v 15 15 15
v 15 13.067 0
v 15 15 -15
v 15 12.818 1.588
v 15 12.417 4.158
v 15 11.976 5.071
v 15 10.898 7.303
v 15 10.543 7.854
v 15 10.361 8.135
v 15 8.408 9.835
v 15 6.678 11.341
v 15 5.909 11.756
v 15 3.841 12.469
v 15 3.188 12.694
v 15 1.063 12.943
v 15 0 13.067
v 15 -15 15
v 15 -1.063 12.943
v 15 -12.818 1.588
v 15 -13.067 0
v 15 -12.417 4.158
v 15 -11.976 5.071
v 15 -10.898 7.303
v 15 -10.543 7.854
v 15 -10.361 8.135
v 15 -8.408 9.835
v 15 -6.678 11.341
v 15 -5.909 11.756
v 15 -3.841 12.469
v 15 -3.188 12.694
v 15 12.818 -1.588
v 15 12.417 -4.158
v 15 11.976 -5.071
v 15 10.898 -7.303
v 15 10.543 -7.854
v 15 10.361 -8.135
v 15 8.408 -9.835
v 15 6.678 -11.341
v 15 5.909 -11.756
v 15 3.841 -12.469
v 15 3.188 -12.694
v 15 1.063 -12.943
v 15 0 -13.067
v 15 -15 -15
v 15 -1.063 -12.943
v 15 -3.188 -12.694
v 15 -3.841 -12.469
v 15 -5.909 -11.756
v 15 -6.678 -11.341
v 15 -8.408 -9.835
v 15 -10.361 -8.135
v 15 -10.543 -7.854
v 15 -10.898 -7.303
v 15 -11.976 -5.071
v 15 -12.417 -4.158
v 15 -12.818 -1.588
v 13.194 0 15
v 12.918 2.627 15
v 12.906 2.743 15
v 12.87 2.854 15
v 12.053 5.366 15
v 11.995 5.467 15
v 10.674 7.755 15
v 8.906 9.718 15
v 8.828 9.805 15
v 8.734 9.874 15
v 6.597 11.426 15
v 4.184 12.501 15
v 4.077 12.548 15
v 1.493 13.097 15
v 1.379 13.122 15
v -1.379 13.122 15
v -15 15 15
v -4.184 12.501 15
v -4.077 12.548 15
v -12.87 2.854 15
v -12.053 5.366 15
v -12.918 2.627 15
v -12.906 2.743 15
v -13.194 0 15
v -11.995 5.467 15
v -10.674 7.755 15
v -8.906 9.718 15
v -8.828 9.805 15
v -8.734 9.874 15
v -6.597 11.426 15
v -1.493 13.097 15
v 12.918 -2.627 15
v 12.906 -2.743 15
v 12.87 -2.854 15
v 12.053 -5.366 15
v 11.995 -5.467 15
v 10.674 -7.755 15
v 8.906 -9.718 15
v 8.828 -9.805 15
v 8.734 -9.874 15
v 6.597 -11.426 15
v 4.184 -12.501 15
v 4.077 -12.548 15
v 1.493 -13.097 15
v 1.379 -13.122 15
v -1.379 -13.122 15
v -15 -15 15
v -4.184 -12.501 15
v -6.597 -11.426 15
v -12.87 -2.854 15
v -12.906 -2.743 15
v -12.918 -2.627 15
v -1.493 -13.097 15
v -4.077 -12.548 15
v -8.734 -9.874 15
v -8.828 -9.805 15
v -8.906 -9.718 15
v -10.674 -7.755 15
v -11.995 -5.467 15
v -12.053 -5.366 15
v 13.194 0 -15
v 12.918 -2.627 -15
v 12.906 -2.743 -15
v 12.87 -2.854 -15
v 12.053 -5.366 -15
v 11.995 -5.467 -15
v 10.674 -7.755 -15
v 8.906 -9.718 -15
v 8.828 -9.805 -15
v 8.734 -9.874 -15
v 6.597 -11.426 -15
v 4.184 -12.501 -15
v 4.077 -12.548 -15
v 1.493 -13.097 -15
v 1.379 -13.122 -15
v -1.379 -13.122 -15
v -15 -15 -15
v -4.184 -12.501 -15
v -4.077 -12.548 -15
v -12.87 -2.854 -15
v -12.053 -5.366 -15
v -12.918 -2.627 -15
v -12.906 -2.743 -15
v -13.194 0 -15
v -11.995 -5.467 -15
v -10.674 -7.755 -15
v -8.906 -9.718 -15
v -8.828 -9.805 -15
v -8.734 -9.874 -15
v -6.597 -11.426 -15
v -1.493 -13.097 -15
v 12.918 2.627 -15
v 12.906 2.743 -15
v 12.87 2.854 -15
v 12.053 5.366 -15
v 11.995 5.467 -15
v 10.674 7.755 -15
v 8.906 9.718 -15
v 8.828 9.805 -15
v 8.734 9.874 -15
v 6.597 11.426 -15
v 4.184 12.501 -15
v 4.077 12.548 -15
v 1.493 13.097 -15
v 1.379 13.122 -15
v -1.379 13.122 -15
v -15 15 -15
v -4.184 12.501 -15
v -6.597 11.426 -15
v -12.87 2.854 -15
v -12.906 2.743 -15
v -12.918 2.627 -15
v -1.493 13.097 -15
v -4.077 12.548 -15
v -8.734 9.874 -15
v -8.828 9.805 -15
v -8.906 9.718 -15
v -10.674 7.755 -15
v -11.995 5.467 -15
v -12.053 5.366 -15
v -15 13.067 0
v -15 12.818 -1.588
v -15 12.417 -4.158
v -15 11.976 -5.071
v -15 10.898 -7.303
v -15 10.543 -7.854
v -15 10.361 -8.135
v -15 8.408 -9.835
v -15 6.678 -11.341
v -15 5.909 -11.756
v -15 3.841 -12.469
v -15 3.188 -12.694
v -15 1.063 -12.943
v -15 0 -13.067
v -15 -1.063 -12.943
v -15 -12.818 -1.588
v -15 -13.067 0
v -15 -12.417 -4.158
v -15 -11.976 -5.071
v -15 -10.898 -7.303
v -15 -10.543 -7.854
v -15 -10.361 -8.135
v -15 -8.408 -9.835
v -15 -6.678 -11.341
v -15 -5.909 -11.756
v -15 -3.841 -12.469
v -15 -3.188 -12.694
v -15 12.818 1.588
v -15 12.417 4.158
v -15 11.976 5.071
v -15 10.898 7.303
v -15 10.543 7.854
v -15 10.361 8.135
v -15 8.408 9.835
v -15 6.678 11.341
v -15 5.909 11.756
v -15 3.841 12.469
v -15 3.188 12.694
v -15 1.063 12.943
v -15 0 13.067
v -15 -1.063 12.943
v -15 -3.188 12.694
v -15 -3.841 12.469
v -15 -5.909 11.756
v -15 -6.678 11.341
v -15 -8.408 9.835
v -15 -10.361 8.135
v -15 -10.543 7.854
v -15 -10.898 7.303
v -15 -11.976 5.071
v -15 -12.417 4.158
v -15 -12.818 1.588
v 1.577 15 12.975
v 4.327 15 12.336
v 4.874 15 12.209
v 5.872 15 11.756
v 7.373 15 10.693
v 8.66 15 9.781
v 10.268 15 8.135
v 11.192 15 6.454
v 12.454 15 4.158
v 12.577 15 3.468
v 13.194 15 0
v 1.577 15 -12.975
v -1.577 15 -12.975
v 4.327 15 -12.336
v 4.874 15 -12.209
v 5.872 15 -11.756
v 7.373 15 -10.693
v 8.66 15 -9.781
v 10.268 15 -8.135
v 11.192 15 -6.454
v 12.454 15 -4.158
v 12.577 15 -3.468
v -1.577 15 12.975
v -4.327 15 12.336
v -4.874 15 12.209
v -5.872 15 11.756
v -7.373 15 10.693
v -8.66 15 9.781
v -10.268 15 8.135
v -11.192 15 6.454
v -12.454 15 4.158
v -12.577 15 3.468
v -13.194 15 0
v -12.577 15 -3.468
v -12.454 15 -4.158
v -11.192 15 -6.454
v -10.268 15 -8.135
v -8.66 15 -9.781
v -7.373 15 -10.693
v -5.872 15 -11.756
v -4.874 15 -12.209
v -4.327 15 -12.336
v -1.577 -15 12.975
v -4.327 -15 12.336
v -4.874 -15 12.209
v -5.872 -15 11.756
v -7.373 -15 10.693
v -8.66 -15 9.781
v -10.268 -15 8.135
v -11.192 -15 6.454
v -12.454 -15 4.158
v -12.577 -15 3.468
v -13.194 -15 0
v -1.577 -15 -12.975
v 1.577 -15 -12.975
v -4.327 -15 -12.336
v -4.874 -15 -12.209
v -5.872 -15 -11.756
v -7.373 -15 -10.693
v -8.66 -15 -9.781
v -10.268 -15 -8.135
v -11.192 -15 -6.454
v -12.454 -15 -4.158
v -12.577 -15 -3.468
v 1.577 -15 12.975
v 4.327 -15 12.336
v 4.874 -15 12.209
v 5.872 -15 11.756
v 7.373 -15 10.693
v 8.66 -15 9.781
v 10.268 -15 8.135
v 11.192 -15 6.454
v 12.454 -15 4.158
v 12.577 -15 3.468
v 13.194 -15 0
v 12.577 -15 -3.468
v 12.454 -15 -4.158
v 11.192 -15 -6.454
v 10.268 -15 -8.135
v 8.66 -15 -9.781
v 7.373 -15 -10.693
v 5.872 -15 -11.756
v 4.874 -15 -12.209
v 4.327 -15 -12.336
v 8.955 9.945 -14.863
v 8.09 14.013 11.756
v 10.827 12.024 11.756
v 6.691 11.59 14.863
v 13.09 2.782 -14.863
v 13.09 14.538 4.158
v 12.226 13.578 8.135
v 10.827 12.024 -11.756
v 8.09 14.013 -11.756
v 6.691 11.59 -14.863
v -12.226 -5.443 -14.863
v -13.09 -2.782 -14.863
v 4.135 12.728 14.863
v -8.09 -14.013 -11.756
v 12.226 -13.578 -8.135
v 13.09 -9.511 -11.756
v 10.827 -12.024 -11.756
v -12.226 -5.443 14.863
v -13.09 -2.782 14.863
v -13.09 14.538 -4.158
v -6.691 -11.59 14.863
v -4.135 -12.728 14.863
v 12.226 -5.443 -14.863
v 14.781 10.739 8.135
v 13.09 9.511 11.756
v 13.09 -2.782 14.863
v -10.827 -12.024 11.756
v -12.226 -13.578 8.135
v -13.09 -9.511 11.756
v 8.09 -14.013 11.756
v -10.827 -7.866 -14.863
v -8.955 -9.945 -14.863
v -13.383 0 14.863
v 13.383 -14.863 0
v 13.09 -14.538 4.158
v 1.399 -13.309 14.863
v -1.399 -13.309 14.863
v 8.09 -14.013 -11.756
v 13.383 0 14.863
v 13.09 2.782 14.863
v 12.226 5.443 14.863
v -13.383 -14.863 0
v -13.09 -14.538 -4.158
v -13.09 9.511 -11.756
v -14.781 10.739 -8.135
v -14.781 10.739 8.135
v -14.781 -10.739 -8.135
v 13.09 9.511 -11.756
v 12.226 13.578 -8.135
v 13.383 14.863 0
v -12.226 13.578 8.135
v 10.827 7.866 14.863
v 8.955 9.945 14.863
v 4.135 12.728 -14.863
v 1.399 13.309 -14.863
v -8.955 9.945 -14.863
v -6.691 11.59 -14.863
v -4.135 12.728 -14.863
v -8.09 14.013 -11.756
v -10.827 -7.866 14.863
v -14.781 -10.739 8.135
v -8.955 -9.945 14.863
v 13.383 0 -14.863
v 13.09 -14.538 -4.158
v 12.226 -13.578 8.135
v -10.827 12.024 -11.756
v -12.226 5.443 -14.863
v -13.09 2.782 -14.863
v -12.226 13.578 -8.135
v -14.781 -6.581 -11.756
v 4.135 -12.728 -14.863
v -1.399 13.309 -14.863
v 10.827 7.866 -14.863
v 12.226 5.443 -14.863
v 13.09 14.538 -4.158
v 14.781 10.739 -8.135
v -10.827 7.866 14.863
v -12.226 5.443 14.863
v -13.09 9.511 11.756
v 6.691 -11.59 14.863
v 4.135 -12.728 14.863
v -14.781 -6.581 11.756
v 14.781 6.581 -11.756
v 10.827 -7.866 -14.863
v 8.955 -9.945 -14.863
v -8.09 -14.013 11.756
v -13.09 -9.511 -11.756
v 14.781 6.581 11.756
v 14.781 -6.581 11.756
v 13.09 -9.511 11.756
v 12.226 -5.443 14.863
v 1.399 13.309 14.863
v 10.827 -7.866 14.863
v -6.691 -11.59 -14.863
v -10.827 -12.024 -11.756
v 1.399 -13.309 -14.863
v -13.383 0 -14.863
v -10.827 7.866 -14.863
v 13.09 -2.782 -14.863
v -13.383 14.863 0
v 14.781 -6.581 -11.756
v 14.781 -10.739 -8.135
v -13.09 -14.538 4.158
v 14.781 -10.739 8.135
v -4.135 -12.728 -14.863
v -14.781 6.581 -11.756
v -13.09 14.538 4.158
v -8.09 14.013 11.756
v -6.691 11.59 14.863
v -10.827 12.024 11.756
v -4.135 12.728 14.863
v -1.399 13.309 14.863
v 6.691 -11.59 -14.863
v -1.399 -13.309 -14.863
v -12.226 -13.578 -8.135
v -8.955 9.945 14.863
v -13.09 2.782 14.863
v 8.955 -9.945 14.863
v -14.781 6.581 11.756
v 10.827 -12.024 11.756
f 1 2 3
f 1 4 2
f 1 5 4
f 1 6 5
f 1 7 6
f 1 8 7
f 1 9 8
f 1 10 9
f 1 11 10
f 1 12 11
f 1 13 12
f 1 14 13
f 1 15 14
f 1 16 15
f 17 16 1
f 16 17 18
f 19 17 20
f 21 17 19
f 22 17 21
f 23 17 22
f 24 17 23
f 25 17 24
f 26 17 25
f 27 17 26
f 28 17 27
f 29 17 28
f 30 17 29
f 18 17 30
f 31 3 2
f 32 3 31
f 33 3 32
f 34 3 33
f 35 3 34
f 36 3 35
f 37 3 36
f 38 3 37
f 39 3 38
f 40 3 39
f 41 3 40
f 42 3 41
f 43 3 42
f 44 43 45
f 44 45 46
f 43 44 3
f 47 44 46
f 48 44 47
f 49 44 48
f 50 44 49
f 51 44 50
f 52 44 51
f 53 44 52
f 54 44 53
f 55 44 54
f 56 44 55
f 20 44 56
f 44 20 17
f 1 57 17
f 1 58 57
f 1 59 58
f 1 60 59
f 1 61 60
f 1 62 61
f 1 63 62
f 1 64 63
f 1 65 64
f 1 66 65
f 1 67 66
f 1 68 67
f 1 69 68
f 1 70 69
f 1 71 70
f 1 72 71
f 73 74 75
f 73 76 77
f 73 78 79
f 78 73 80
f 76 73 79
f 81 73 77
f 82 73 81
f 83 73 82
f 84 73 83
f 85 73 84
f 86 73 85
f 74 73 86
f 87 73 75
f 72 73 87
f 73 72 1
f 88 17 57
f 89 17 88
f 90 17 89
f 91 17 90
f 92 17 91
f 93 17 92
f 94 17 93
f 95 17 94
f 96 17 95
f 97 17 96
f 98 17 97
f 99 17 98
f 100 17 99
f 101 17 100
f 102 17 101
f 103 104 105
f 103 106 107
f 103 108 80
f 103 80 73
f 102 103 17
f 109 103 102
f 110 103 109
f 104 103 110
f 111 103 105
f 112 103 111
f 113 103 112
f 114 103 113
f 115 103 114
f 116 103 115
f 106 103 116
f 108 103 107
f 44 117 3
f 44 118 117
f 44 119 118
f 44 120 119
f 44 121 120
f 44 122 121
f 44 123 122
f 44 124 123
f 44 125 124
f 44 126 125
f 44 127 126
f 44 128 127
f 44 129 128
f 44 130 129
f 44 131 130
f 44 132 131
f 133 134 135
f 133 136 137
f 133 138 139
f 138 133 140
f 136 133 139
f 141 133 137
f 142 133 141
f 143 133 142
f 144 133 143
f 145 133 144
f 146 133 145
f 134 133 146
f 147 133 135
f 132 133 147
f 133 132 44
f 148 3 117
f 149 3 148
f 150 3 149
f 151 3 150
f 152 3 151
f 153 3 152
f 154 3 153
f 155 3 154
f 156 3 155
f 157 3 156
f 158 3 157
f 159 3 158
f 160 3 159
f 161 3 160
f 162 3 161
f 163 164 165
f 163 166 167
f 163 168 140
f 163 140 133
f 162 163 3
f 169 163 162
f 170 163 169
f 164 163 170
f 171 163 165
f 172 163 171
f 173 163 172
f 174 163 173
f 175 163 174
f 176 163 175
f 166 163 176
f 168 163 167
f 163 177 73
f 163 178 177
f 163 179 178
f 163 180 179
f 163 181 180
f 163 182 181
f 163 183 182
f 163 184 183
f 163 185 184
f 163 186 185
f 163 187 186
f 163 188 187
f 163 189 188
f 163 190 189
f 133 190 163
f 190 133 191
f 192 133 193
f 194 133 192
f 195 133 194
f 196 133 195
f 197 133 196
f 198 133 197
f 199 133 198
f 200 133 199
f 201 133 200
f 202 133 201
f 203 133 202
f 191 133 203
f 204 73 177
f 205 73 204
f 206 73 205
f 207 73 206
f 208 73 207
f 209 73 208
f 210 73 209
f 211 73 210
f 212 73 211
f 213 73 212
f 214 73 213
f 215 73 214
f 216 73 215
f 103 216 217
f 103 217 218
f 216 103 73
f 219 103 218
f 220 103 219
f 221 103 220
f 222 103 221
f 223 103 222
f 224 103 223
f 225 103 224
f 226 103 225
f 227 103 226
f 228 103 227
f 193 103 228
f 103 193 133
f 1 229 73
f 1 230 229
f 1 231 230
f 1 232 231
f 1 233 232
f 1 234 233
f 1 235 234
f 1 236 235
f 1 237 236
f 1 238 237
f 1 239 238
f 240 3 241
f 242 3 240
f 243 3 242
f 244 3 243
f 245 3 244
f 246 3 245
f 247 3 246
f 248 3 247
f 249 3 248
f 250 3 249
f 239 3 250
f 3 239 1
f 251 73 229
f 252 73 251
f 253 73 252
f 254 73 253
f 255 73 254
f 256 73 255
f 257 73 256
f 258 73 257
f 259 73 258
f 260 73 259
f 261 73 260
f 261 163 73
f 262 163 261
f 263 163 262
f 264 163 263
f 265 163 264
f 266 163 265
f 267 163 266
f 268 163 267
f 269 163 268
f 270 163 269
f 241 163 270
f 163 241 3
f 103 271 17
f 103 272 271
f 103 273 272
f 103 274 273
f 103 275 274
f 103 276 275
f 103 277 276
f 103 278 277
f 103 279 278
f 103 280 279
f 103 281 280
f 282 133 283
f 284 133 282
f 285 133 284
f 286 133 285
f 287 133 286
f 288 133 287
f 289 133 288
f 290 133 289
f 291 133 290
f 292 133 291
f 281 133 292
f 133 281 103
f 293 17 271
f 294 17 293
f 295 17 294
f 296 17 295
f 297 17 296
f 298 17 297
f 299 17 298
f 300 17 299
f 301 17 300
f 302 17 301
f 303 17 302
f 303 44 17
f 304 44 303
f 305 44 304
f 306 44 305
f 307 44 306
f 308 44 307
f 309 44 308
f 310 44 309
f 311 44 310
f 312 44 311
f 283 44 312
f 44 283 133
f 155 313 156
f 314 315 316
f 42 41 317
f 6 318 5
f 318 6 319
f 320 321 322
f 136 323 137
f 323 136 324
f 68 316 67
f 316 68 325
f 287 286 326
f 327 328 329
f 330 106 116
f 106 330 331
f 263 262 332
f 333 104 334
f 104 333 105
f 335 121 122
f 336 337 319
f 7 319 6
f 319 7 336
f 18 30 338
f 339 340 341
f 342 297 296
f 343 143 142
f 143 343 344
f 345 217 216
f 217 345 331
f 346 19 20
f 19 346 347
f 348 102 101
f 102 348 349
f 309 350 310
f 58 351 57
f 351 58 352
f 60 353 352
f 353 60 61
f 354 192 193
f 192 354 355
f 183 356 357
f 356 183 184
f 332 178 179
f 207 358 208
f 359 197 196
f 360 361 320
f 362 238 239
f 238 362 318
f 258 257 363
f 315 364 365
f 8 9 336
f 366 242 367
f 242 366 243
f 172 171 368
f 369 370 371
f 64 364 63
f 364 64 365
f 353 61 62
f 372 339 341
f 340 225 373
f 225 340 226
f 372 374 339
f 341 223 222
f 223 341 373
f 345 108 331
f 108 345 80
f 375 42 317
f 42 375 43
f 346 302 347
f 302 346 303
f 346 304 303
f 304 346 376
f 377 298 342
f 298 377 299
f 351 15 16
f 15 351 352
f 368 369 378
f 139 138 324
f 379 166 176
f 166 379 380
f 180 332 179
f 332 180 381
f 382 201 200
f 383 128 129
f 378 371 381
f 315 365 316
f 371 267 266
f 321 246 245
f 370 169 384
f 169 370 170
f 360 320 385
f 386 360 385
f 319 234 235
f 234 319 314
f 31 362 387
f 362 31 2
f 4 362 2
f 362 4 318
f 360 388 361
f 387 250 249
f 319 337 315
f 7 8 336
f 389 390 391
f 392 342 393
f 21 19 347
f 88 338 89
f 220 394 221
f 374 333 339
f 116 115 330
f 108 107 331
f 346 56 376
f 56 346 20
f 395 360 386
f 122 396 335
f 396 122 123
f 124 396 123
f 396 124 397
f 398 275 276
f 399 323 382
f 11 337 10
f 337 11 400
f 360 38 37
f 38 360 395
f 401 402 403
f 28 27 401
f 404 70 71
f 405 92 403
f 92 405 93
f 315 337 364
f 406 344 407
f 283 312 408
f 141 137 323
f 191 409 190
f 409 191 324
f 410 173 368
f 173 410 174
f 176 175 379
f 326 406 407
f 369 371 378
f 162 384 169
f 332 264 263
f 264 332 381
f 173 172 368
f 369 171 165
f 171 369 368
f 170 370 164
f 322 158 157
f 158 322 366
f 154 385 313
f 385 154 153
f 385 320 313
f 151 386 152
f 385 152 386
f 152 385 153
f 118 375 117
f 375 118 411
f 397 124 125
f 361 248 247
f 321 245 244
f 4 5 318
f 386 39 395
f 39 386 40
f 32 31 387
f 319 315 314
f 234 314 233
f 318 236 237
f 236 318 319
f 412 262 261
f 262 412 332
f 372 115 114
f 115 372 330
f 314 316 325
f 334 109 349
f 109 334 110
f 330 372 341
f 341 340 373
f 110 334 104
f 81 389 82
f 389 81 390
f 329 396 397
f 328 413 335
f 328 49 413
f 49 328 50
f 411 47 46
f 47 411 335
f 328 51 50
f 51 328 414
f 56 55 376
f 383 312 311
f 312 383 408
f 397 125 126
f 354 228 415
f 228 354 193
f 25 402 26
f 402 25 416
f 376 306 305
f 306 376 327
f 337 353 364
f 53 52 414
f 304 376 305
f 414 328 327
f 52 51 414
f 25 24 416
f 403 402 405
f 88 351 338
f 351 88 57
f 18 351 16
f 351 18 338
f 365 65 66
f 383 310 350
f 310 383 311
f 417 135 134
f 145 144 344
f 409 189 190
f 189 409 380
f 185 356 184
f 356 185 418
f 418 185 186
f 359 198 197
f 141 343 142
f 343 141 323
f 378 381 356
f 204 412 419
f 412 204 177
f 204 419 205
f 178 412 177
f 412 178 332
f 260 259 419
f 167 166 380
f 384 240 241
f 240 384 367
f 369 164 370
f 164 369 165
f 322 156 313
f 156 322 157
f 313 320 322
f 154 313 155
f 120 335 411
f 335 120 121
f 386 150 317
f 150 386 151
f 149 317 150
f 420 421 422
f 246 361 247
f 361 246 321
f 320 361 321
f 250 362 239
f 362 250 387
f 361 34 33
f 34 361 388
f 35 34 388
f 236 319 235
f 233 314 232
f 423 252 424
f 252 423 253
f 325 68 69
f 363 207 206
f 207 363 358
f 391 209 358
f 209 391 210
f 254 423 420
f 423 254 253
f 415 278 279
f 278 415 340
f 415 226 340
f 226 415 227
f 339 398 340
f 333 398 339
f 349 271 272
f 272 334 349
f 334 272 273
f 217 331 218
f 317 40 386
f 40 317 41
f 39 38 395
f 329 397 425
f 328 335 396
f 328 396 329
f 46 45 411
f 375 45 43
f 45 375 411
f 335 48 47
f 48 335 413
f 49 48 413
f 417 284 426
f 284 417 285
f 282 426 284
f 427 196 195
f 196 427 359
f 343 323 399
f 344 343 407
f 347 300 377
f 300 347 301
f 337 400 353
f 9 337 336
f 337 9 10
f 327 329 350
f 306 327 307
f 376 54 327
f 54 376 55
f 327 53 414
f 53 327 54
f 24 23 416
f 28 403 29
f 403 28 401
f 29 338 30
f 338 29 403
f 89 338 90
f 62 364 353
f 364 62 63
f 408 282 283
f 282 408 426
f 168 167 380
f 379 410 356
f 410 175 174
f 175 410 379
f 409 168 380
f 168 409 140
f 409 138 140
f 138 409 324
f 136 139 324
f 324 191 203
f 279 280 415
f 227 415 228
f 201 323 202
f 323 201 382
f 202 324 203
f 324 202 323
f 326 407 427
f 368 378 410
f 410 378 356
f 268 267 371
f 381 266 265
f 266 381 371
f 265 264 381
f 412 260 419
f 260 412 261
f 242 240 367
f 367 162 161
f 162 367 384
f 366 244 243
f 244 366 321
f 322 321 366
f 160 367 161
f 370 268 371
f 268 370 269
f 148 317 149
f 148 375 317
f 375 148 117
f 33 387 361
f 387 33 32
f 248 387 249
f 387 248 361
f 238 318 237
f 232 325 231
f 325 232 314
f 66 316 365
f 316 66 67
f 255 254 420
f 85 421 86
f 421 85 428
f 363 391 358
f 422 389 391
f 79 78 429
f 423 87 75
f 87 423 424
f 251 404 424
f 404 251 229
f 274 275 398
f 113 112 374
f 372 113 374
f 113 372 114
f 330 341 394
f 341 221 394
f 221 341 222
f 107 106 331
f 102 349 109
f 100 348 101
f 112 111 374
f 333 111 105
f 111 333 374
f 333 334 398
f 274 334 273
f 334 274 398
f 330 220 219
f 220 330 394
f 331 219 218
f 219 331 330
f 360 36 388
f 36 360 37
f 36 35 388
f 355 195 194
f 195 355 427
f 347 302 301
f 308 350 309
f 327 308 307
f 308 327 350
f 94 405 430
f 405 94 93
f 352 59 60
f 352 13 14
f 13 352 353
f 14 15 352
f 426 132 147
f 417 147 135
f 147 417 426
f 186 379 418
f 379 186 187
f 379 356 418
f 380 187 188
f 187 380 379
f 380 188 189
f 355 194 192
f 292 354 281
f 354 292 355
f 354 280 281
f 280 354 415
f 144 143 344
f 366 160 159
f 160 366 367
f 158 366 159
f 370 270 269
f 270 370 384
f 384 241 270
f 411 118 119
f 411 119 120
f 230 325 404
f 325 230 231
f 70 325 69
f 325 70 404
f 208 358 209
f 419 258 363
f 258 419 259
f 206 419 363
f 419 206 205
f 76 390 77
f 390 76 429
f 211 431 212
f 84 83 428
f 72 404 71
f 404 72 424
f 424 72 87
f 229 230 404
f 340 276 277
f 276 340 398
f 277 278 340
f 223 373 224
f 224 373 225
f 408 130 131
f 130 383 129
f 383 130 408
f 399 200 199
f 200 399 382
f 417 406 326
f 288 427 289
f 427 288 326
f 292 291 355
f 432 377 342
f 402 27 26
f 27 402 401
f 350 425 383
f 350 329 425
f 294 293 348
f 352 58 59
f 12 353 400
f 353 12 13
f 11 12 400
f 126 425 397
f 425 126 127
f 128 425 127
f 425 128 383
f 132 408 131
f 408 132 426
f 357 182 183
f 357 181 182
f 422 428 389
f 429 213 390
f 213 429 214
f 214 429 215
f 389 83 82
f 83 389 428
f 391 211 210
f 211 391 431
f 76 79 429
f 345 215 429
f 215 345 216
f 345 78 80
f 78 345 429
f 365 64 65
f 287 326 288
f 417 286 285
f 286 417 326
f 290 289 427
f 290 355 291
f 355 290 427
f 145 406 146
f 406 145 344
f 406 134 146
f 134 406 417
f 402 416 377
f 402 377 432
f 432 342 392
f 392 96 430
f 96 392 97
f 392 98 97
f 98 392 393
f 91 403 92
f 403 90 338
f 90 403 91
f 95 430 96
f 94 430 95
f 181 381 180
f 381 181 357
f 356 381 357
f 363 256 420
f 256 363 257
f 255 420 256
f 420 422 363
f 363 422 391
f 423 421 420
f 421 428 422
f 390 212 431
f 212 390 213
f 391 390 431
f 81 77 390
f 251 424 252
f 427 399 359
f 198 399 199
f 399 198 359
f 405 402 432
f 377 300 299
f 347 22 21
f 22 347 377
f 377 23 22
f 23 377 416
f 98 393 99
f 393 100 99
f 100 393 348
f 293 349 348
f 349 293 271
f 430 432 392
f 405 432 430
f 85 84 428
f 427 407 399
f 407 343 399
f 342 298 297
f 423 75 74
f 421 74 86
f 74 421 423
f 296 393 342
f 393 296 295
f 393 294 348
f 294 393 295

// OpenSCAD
// Volume: 2284.3832366698675, SurfaceArea: 3486.5649762072785

module example004()
{
  difference() {
    cube(30, center = true);
    sphere(20);
  }
}

echo(version=version());

example004();

// Written by Clifford Wolf <clifford@clifford.at> and Marius
// Kintel <marius@kintel.net>
//
// To the extent possible under law, the author(s) have dedicated all
// copyright and related and neighboring rights to this software to the
// public domain worldwide. This software is distributed without any
// warranty.
//
// You should have received a copy of the CC0 Public Domain
// Dedication along with this software.
// If not, see <http://creativecommons.org/publicdomain/zero/1.0/>.
